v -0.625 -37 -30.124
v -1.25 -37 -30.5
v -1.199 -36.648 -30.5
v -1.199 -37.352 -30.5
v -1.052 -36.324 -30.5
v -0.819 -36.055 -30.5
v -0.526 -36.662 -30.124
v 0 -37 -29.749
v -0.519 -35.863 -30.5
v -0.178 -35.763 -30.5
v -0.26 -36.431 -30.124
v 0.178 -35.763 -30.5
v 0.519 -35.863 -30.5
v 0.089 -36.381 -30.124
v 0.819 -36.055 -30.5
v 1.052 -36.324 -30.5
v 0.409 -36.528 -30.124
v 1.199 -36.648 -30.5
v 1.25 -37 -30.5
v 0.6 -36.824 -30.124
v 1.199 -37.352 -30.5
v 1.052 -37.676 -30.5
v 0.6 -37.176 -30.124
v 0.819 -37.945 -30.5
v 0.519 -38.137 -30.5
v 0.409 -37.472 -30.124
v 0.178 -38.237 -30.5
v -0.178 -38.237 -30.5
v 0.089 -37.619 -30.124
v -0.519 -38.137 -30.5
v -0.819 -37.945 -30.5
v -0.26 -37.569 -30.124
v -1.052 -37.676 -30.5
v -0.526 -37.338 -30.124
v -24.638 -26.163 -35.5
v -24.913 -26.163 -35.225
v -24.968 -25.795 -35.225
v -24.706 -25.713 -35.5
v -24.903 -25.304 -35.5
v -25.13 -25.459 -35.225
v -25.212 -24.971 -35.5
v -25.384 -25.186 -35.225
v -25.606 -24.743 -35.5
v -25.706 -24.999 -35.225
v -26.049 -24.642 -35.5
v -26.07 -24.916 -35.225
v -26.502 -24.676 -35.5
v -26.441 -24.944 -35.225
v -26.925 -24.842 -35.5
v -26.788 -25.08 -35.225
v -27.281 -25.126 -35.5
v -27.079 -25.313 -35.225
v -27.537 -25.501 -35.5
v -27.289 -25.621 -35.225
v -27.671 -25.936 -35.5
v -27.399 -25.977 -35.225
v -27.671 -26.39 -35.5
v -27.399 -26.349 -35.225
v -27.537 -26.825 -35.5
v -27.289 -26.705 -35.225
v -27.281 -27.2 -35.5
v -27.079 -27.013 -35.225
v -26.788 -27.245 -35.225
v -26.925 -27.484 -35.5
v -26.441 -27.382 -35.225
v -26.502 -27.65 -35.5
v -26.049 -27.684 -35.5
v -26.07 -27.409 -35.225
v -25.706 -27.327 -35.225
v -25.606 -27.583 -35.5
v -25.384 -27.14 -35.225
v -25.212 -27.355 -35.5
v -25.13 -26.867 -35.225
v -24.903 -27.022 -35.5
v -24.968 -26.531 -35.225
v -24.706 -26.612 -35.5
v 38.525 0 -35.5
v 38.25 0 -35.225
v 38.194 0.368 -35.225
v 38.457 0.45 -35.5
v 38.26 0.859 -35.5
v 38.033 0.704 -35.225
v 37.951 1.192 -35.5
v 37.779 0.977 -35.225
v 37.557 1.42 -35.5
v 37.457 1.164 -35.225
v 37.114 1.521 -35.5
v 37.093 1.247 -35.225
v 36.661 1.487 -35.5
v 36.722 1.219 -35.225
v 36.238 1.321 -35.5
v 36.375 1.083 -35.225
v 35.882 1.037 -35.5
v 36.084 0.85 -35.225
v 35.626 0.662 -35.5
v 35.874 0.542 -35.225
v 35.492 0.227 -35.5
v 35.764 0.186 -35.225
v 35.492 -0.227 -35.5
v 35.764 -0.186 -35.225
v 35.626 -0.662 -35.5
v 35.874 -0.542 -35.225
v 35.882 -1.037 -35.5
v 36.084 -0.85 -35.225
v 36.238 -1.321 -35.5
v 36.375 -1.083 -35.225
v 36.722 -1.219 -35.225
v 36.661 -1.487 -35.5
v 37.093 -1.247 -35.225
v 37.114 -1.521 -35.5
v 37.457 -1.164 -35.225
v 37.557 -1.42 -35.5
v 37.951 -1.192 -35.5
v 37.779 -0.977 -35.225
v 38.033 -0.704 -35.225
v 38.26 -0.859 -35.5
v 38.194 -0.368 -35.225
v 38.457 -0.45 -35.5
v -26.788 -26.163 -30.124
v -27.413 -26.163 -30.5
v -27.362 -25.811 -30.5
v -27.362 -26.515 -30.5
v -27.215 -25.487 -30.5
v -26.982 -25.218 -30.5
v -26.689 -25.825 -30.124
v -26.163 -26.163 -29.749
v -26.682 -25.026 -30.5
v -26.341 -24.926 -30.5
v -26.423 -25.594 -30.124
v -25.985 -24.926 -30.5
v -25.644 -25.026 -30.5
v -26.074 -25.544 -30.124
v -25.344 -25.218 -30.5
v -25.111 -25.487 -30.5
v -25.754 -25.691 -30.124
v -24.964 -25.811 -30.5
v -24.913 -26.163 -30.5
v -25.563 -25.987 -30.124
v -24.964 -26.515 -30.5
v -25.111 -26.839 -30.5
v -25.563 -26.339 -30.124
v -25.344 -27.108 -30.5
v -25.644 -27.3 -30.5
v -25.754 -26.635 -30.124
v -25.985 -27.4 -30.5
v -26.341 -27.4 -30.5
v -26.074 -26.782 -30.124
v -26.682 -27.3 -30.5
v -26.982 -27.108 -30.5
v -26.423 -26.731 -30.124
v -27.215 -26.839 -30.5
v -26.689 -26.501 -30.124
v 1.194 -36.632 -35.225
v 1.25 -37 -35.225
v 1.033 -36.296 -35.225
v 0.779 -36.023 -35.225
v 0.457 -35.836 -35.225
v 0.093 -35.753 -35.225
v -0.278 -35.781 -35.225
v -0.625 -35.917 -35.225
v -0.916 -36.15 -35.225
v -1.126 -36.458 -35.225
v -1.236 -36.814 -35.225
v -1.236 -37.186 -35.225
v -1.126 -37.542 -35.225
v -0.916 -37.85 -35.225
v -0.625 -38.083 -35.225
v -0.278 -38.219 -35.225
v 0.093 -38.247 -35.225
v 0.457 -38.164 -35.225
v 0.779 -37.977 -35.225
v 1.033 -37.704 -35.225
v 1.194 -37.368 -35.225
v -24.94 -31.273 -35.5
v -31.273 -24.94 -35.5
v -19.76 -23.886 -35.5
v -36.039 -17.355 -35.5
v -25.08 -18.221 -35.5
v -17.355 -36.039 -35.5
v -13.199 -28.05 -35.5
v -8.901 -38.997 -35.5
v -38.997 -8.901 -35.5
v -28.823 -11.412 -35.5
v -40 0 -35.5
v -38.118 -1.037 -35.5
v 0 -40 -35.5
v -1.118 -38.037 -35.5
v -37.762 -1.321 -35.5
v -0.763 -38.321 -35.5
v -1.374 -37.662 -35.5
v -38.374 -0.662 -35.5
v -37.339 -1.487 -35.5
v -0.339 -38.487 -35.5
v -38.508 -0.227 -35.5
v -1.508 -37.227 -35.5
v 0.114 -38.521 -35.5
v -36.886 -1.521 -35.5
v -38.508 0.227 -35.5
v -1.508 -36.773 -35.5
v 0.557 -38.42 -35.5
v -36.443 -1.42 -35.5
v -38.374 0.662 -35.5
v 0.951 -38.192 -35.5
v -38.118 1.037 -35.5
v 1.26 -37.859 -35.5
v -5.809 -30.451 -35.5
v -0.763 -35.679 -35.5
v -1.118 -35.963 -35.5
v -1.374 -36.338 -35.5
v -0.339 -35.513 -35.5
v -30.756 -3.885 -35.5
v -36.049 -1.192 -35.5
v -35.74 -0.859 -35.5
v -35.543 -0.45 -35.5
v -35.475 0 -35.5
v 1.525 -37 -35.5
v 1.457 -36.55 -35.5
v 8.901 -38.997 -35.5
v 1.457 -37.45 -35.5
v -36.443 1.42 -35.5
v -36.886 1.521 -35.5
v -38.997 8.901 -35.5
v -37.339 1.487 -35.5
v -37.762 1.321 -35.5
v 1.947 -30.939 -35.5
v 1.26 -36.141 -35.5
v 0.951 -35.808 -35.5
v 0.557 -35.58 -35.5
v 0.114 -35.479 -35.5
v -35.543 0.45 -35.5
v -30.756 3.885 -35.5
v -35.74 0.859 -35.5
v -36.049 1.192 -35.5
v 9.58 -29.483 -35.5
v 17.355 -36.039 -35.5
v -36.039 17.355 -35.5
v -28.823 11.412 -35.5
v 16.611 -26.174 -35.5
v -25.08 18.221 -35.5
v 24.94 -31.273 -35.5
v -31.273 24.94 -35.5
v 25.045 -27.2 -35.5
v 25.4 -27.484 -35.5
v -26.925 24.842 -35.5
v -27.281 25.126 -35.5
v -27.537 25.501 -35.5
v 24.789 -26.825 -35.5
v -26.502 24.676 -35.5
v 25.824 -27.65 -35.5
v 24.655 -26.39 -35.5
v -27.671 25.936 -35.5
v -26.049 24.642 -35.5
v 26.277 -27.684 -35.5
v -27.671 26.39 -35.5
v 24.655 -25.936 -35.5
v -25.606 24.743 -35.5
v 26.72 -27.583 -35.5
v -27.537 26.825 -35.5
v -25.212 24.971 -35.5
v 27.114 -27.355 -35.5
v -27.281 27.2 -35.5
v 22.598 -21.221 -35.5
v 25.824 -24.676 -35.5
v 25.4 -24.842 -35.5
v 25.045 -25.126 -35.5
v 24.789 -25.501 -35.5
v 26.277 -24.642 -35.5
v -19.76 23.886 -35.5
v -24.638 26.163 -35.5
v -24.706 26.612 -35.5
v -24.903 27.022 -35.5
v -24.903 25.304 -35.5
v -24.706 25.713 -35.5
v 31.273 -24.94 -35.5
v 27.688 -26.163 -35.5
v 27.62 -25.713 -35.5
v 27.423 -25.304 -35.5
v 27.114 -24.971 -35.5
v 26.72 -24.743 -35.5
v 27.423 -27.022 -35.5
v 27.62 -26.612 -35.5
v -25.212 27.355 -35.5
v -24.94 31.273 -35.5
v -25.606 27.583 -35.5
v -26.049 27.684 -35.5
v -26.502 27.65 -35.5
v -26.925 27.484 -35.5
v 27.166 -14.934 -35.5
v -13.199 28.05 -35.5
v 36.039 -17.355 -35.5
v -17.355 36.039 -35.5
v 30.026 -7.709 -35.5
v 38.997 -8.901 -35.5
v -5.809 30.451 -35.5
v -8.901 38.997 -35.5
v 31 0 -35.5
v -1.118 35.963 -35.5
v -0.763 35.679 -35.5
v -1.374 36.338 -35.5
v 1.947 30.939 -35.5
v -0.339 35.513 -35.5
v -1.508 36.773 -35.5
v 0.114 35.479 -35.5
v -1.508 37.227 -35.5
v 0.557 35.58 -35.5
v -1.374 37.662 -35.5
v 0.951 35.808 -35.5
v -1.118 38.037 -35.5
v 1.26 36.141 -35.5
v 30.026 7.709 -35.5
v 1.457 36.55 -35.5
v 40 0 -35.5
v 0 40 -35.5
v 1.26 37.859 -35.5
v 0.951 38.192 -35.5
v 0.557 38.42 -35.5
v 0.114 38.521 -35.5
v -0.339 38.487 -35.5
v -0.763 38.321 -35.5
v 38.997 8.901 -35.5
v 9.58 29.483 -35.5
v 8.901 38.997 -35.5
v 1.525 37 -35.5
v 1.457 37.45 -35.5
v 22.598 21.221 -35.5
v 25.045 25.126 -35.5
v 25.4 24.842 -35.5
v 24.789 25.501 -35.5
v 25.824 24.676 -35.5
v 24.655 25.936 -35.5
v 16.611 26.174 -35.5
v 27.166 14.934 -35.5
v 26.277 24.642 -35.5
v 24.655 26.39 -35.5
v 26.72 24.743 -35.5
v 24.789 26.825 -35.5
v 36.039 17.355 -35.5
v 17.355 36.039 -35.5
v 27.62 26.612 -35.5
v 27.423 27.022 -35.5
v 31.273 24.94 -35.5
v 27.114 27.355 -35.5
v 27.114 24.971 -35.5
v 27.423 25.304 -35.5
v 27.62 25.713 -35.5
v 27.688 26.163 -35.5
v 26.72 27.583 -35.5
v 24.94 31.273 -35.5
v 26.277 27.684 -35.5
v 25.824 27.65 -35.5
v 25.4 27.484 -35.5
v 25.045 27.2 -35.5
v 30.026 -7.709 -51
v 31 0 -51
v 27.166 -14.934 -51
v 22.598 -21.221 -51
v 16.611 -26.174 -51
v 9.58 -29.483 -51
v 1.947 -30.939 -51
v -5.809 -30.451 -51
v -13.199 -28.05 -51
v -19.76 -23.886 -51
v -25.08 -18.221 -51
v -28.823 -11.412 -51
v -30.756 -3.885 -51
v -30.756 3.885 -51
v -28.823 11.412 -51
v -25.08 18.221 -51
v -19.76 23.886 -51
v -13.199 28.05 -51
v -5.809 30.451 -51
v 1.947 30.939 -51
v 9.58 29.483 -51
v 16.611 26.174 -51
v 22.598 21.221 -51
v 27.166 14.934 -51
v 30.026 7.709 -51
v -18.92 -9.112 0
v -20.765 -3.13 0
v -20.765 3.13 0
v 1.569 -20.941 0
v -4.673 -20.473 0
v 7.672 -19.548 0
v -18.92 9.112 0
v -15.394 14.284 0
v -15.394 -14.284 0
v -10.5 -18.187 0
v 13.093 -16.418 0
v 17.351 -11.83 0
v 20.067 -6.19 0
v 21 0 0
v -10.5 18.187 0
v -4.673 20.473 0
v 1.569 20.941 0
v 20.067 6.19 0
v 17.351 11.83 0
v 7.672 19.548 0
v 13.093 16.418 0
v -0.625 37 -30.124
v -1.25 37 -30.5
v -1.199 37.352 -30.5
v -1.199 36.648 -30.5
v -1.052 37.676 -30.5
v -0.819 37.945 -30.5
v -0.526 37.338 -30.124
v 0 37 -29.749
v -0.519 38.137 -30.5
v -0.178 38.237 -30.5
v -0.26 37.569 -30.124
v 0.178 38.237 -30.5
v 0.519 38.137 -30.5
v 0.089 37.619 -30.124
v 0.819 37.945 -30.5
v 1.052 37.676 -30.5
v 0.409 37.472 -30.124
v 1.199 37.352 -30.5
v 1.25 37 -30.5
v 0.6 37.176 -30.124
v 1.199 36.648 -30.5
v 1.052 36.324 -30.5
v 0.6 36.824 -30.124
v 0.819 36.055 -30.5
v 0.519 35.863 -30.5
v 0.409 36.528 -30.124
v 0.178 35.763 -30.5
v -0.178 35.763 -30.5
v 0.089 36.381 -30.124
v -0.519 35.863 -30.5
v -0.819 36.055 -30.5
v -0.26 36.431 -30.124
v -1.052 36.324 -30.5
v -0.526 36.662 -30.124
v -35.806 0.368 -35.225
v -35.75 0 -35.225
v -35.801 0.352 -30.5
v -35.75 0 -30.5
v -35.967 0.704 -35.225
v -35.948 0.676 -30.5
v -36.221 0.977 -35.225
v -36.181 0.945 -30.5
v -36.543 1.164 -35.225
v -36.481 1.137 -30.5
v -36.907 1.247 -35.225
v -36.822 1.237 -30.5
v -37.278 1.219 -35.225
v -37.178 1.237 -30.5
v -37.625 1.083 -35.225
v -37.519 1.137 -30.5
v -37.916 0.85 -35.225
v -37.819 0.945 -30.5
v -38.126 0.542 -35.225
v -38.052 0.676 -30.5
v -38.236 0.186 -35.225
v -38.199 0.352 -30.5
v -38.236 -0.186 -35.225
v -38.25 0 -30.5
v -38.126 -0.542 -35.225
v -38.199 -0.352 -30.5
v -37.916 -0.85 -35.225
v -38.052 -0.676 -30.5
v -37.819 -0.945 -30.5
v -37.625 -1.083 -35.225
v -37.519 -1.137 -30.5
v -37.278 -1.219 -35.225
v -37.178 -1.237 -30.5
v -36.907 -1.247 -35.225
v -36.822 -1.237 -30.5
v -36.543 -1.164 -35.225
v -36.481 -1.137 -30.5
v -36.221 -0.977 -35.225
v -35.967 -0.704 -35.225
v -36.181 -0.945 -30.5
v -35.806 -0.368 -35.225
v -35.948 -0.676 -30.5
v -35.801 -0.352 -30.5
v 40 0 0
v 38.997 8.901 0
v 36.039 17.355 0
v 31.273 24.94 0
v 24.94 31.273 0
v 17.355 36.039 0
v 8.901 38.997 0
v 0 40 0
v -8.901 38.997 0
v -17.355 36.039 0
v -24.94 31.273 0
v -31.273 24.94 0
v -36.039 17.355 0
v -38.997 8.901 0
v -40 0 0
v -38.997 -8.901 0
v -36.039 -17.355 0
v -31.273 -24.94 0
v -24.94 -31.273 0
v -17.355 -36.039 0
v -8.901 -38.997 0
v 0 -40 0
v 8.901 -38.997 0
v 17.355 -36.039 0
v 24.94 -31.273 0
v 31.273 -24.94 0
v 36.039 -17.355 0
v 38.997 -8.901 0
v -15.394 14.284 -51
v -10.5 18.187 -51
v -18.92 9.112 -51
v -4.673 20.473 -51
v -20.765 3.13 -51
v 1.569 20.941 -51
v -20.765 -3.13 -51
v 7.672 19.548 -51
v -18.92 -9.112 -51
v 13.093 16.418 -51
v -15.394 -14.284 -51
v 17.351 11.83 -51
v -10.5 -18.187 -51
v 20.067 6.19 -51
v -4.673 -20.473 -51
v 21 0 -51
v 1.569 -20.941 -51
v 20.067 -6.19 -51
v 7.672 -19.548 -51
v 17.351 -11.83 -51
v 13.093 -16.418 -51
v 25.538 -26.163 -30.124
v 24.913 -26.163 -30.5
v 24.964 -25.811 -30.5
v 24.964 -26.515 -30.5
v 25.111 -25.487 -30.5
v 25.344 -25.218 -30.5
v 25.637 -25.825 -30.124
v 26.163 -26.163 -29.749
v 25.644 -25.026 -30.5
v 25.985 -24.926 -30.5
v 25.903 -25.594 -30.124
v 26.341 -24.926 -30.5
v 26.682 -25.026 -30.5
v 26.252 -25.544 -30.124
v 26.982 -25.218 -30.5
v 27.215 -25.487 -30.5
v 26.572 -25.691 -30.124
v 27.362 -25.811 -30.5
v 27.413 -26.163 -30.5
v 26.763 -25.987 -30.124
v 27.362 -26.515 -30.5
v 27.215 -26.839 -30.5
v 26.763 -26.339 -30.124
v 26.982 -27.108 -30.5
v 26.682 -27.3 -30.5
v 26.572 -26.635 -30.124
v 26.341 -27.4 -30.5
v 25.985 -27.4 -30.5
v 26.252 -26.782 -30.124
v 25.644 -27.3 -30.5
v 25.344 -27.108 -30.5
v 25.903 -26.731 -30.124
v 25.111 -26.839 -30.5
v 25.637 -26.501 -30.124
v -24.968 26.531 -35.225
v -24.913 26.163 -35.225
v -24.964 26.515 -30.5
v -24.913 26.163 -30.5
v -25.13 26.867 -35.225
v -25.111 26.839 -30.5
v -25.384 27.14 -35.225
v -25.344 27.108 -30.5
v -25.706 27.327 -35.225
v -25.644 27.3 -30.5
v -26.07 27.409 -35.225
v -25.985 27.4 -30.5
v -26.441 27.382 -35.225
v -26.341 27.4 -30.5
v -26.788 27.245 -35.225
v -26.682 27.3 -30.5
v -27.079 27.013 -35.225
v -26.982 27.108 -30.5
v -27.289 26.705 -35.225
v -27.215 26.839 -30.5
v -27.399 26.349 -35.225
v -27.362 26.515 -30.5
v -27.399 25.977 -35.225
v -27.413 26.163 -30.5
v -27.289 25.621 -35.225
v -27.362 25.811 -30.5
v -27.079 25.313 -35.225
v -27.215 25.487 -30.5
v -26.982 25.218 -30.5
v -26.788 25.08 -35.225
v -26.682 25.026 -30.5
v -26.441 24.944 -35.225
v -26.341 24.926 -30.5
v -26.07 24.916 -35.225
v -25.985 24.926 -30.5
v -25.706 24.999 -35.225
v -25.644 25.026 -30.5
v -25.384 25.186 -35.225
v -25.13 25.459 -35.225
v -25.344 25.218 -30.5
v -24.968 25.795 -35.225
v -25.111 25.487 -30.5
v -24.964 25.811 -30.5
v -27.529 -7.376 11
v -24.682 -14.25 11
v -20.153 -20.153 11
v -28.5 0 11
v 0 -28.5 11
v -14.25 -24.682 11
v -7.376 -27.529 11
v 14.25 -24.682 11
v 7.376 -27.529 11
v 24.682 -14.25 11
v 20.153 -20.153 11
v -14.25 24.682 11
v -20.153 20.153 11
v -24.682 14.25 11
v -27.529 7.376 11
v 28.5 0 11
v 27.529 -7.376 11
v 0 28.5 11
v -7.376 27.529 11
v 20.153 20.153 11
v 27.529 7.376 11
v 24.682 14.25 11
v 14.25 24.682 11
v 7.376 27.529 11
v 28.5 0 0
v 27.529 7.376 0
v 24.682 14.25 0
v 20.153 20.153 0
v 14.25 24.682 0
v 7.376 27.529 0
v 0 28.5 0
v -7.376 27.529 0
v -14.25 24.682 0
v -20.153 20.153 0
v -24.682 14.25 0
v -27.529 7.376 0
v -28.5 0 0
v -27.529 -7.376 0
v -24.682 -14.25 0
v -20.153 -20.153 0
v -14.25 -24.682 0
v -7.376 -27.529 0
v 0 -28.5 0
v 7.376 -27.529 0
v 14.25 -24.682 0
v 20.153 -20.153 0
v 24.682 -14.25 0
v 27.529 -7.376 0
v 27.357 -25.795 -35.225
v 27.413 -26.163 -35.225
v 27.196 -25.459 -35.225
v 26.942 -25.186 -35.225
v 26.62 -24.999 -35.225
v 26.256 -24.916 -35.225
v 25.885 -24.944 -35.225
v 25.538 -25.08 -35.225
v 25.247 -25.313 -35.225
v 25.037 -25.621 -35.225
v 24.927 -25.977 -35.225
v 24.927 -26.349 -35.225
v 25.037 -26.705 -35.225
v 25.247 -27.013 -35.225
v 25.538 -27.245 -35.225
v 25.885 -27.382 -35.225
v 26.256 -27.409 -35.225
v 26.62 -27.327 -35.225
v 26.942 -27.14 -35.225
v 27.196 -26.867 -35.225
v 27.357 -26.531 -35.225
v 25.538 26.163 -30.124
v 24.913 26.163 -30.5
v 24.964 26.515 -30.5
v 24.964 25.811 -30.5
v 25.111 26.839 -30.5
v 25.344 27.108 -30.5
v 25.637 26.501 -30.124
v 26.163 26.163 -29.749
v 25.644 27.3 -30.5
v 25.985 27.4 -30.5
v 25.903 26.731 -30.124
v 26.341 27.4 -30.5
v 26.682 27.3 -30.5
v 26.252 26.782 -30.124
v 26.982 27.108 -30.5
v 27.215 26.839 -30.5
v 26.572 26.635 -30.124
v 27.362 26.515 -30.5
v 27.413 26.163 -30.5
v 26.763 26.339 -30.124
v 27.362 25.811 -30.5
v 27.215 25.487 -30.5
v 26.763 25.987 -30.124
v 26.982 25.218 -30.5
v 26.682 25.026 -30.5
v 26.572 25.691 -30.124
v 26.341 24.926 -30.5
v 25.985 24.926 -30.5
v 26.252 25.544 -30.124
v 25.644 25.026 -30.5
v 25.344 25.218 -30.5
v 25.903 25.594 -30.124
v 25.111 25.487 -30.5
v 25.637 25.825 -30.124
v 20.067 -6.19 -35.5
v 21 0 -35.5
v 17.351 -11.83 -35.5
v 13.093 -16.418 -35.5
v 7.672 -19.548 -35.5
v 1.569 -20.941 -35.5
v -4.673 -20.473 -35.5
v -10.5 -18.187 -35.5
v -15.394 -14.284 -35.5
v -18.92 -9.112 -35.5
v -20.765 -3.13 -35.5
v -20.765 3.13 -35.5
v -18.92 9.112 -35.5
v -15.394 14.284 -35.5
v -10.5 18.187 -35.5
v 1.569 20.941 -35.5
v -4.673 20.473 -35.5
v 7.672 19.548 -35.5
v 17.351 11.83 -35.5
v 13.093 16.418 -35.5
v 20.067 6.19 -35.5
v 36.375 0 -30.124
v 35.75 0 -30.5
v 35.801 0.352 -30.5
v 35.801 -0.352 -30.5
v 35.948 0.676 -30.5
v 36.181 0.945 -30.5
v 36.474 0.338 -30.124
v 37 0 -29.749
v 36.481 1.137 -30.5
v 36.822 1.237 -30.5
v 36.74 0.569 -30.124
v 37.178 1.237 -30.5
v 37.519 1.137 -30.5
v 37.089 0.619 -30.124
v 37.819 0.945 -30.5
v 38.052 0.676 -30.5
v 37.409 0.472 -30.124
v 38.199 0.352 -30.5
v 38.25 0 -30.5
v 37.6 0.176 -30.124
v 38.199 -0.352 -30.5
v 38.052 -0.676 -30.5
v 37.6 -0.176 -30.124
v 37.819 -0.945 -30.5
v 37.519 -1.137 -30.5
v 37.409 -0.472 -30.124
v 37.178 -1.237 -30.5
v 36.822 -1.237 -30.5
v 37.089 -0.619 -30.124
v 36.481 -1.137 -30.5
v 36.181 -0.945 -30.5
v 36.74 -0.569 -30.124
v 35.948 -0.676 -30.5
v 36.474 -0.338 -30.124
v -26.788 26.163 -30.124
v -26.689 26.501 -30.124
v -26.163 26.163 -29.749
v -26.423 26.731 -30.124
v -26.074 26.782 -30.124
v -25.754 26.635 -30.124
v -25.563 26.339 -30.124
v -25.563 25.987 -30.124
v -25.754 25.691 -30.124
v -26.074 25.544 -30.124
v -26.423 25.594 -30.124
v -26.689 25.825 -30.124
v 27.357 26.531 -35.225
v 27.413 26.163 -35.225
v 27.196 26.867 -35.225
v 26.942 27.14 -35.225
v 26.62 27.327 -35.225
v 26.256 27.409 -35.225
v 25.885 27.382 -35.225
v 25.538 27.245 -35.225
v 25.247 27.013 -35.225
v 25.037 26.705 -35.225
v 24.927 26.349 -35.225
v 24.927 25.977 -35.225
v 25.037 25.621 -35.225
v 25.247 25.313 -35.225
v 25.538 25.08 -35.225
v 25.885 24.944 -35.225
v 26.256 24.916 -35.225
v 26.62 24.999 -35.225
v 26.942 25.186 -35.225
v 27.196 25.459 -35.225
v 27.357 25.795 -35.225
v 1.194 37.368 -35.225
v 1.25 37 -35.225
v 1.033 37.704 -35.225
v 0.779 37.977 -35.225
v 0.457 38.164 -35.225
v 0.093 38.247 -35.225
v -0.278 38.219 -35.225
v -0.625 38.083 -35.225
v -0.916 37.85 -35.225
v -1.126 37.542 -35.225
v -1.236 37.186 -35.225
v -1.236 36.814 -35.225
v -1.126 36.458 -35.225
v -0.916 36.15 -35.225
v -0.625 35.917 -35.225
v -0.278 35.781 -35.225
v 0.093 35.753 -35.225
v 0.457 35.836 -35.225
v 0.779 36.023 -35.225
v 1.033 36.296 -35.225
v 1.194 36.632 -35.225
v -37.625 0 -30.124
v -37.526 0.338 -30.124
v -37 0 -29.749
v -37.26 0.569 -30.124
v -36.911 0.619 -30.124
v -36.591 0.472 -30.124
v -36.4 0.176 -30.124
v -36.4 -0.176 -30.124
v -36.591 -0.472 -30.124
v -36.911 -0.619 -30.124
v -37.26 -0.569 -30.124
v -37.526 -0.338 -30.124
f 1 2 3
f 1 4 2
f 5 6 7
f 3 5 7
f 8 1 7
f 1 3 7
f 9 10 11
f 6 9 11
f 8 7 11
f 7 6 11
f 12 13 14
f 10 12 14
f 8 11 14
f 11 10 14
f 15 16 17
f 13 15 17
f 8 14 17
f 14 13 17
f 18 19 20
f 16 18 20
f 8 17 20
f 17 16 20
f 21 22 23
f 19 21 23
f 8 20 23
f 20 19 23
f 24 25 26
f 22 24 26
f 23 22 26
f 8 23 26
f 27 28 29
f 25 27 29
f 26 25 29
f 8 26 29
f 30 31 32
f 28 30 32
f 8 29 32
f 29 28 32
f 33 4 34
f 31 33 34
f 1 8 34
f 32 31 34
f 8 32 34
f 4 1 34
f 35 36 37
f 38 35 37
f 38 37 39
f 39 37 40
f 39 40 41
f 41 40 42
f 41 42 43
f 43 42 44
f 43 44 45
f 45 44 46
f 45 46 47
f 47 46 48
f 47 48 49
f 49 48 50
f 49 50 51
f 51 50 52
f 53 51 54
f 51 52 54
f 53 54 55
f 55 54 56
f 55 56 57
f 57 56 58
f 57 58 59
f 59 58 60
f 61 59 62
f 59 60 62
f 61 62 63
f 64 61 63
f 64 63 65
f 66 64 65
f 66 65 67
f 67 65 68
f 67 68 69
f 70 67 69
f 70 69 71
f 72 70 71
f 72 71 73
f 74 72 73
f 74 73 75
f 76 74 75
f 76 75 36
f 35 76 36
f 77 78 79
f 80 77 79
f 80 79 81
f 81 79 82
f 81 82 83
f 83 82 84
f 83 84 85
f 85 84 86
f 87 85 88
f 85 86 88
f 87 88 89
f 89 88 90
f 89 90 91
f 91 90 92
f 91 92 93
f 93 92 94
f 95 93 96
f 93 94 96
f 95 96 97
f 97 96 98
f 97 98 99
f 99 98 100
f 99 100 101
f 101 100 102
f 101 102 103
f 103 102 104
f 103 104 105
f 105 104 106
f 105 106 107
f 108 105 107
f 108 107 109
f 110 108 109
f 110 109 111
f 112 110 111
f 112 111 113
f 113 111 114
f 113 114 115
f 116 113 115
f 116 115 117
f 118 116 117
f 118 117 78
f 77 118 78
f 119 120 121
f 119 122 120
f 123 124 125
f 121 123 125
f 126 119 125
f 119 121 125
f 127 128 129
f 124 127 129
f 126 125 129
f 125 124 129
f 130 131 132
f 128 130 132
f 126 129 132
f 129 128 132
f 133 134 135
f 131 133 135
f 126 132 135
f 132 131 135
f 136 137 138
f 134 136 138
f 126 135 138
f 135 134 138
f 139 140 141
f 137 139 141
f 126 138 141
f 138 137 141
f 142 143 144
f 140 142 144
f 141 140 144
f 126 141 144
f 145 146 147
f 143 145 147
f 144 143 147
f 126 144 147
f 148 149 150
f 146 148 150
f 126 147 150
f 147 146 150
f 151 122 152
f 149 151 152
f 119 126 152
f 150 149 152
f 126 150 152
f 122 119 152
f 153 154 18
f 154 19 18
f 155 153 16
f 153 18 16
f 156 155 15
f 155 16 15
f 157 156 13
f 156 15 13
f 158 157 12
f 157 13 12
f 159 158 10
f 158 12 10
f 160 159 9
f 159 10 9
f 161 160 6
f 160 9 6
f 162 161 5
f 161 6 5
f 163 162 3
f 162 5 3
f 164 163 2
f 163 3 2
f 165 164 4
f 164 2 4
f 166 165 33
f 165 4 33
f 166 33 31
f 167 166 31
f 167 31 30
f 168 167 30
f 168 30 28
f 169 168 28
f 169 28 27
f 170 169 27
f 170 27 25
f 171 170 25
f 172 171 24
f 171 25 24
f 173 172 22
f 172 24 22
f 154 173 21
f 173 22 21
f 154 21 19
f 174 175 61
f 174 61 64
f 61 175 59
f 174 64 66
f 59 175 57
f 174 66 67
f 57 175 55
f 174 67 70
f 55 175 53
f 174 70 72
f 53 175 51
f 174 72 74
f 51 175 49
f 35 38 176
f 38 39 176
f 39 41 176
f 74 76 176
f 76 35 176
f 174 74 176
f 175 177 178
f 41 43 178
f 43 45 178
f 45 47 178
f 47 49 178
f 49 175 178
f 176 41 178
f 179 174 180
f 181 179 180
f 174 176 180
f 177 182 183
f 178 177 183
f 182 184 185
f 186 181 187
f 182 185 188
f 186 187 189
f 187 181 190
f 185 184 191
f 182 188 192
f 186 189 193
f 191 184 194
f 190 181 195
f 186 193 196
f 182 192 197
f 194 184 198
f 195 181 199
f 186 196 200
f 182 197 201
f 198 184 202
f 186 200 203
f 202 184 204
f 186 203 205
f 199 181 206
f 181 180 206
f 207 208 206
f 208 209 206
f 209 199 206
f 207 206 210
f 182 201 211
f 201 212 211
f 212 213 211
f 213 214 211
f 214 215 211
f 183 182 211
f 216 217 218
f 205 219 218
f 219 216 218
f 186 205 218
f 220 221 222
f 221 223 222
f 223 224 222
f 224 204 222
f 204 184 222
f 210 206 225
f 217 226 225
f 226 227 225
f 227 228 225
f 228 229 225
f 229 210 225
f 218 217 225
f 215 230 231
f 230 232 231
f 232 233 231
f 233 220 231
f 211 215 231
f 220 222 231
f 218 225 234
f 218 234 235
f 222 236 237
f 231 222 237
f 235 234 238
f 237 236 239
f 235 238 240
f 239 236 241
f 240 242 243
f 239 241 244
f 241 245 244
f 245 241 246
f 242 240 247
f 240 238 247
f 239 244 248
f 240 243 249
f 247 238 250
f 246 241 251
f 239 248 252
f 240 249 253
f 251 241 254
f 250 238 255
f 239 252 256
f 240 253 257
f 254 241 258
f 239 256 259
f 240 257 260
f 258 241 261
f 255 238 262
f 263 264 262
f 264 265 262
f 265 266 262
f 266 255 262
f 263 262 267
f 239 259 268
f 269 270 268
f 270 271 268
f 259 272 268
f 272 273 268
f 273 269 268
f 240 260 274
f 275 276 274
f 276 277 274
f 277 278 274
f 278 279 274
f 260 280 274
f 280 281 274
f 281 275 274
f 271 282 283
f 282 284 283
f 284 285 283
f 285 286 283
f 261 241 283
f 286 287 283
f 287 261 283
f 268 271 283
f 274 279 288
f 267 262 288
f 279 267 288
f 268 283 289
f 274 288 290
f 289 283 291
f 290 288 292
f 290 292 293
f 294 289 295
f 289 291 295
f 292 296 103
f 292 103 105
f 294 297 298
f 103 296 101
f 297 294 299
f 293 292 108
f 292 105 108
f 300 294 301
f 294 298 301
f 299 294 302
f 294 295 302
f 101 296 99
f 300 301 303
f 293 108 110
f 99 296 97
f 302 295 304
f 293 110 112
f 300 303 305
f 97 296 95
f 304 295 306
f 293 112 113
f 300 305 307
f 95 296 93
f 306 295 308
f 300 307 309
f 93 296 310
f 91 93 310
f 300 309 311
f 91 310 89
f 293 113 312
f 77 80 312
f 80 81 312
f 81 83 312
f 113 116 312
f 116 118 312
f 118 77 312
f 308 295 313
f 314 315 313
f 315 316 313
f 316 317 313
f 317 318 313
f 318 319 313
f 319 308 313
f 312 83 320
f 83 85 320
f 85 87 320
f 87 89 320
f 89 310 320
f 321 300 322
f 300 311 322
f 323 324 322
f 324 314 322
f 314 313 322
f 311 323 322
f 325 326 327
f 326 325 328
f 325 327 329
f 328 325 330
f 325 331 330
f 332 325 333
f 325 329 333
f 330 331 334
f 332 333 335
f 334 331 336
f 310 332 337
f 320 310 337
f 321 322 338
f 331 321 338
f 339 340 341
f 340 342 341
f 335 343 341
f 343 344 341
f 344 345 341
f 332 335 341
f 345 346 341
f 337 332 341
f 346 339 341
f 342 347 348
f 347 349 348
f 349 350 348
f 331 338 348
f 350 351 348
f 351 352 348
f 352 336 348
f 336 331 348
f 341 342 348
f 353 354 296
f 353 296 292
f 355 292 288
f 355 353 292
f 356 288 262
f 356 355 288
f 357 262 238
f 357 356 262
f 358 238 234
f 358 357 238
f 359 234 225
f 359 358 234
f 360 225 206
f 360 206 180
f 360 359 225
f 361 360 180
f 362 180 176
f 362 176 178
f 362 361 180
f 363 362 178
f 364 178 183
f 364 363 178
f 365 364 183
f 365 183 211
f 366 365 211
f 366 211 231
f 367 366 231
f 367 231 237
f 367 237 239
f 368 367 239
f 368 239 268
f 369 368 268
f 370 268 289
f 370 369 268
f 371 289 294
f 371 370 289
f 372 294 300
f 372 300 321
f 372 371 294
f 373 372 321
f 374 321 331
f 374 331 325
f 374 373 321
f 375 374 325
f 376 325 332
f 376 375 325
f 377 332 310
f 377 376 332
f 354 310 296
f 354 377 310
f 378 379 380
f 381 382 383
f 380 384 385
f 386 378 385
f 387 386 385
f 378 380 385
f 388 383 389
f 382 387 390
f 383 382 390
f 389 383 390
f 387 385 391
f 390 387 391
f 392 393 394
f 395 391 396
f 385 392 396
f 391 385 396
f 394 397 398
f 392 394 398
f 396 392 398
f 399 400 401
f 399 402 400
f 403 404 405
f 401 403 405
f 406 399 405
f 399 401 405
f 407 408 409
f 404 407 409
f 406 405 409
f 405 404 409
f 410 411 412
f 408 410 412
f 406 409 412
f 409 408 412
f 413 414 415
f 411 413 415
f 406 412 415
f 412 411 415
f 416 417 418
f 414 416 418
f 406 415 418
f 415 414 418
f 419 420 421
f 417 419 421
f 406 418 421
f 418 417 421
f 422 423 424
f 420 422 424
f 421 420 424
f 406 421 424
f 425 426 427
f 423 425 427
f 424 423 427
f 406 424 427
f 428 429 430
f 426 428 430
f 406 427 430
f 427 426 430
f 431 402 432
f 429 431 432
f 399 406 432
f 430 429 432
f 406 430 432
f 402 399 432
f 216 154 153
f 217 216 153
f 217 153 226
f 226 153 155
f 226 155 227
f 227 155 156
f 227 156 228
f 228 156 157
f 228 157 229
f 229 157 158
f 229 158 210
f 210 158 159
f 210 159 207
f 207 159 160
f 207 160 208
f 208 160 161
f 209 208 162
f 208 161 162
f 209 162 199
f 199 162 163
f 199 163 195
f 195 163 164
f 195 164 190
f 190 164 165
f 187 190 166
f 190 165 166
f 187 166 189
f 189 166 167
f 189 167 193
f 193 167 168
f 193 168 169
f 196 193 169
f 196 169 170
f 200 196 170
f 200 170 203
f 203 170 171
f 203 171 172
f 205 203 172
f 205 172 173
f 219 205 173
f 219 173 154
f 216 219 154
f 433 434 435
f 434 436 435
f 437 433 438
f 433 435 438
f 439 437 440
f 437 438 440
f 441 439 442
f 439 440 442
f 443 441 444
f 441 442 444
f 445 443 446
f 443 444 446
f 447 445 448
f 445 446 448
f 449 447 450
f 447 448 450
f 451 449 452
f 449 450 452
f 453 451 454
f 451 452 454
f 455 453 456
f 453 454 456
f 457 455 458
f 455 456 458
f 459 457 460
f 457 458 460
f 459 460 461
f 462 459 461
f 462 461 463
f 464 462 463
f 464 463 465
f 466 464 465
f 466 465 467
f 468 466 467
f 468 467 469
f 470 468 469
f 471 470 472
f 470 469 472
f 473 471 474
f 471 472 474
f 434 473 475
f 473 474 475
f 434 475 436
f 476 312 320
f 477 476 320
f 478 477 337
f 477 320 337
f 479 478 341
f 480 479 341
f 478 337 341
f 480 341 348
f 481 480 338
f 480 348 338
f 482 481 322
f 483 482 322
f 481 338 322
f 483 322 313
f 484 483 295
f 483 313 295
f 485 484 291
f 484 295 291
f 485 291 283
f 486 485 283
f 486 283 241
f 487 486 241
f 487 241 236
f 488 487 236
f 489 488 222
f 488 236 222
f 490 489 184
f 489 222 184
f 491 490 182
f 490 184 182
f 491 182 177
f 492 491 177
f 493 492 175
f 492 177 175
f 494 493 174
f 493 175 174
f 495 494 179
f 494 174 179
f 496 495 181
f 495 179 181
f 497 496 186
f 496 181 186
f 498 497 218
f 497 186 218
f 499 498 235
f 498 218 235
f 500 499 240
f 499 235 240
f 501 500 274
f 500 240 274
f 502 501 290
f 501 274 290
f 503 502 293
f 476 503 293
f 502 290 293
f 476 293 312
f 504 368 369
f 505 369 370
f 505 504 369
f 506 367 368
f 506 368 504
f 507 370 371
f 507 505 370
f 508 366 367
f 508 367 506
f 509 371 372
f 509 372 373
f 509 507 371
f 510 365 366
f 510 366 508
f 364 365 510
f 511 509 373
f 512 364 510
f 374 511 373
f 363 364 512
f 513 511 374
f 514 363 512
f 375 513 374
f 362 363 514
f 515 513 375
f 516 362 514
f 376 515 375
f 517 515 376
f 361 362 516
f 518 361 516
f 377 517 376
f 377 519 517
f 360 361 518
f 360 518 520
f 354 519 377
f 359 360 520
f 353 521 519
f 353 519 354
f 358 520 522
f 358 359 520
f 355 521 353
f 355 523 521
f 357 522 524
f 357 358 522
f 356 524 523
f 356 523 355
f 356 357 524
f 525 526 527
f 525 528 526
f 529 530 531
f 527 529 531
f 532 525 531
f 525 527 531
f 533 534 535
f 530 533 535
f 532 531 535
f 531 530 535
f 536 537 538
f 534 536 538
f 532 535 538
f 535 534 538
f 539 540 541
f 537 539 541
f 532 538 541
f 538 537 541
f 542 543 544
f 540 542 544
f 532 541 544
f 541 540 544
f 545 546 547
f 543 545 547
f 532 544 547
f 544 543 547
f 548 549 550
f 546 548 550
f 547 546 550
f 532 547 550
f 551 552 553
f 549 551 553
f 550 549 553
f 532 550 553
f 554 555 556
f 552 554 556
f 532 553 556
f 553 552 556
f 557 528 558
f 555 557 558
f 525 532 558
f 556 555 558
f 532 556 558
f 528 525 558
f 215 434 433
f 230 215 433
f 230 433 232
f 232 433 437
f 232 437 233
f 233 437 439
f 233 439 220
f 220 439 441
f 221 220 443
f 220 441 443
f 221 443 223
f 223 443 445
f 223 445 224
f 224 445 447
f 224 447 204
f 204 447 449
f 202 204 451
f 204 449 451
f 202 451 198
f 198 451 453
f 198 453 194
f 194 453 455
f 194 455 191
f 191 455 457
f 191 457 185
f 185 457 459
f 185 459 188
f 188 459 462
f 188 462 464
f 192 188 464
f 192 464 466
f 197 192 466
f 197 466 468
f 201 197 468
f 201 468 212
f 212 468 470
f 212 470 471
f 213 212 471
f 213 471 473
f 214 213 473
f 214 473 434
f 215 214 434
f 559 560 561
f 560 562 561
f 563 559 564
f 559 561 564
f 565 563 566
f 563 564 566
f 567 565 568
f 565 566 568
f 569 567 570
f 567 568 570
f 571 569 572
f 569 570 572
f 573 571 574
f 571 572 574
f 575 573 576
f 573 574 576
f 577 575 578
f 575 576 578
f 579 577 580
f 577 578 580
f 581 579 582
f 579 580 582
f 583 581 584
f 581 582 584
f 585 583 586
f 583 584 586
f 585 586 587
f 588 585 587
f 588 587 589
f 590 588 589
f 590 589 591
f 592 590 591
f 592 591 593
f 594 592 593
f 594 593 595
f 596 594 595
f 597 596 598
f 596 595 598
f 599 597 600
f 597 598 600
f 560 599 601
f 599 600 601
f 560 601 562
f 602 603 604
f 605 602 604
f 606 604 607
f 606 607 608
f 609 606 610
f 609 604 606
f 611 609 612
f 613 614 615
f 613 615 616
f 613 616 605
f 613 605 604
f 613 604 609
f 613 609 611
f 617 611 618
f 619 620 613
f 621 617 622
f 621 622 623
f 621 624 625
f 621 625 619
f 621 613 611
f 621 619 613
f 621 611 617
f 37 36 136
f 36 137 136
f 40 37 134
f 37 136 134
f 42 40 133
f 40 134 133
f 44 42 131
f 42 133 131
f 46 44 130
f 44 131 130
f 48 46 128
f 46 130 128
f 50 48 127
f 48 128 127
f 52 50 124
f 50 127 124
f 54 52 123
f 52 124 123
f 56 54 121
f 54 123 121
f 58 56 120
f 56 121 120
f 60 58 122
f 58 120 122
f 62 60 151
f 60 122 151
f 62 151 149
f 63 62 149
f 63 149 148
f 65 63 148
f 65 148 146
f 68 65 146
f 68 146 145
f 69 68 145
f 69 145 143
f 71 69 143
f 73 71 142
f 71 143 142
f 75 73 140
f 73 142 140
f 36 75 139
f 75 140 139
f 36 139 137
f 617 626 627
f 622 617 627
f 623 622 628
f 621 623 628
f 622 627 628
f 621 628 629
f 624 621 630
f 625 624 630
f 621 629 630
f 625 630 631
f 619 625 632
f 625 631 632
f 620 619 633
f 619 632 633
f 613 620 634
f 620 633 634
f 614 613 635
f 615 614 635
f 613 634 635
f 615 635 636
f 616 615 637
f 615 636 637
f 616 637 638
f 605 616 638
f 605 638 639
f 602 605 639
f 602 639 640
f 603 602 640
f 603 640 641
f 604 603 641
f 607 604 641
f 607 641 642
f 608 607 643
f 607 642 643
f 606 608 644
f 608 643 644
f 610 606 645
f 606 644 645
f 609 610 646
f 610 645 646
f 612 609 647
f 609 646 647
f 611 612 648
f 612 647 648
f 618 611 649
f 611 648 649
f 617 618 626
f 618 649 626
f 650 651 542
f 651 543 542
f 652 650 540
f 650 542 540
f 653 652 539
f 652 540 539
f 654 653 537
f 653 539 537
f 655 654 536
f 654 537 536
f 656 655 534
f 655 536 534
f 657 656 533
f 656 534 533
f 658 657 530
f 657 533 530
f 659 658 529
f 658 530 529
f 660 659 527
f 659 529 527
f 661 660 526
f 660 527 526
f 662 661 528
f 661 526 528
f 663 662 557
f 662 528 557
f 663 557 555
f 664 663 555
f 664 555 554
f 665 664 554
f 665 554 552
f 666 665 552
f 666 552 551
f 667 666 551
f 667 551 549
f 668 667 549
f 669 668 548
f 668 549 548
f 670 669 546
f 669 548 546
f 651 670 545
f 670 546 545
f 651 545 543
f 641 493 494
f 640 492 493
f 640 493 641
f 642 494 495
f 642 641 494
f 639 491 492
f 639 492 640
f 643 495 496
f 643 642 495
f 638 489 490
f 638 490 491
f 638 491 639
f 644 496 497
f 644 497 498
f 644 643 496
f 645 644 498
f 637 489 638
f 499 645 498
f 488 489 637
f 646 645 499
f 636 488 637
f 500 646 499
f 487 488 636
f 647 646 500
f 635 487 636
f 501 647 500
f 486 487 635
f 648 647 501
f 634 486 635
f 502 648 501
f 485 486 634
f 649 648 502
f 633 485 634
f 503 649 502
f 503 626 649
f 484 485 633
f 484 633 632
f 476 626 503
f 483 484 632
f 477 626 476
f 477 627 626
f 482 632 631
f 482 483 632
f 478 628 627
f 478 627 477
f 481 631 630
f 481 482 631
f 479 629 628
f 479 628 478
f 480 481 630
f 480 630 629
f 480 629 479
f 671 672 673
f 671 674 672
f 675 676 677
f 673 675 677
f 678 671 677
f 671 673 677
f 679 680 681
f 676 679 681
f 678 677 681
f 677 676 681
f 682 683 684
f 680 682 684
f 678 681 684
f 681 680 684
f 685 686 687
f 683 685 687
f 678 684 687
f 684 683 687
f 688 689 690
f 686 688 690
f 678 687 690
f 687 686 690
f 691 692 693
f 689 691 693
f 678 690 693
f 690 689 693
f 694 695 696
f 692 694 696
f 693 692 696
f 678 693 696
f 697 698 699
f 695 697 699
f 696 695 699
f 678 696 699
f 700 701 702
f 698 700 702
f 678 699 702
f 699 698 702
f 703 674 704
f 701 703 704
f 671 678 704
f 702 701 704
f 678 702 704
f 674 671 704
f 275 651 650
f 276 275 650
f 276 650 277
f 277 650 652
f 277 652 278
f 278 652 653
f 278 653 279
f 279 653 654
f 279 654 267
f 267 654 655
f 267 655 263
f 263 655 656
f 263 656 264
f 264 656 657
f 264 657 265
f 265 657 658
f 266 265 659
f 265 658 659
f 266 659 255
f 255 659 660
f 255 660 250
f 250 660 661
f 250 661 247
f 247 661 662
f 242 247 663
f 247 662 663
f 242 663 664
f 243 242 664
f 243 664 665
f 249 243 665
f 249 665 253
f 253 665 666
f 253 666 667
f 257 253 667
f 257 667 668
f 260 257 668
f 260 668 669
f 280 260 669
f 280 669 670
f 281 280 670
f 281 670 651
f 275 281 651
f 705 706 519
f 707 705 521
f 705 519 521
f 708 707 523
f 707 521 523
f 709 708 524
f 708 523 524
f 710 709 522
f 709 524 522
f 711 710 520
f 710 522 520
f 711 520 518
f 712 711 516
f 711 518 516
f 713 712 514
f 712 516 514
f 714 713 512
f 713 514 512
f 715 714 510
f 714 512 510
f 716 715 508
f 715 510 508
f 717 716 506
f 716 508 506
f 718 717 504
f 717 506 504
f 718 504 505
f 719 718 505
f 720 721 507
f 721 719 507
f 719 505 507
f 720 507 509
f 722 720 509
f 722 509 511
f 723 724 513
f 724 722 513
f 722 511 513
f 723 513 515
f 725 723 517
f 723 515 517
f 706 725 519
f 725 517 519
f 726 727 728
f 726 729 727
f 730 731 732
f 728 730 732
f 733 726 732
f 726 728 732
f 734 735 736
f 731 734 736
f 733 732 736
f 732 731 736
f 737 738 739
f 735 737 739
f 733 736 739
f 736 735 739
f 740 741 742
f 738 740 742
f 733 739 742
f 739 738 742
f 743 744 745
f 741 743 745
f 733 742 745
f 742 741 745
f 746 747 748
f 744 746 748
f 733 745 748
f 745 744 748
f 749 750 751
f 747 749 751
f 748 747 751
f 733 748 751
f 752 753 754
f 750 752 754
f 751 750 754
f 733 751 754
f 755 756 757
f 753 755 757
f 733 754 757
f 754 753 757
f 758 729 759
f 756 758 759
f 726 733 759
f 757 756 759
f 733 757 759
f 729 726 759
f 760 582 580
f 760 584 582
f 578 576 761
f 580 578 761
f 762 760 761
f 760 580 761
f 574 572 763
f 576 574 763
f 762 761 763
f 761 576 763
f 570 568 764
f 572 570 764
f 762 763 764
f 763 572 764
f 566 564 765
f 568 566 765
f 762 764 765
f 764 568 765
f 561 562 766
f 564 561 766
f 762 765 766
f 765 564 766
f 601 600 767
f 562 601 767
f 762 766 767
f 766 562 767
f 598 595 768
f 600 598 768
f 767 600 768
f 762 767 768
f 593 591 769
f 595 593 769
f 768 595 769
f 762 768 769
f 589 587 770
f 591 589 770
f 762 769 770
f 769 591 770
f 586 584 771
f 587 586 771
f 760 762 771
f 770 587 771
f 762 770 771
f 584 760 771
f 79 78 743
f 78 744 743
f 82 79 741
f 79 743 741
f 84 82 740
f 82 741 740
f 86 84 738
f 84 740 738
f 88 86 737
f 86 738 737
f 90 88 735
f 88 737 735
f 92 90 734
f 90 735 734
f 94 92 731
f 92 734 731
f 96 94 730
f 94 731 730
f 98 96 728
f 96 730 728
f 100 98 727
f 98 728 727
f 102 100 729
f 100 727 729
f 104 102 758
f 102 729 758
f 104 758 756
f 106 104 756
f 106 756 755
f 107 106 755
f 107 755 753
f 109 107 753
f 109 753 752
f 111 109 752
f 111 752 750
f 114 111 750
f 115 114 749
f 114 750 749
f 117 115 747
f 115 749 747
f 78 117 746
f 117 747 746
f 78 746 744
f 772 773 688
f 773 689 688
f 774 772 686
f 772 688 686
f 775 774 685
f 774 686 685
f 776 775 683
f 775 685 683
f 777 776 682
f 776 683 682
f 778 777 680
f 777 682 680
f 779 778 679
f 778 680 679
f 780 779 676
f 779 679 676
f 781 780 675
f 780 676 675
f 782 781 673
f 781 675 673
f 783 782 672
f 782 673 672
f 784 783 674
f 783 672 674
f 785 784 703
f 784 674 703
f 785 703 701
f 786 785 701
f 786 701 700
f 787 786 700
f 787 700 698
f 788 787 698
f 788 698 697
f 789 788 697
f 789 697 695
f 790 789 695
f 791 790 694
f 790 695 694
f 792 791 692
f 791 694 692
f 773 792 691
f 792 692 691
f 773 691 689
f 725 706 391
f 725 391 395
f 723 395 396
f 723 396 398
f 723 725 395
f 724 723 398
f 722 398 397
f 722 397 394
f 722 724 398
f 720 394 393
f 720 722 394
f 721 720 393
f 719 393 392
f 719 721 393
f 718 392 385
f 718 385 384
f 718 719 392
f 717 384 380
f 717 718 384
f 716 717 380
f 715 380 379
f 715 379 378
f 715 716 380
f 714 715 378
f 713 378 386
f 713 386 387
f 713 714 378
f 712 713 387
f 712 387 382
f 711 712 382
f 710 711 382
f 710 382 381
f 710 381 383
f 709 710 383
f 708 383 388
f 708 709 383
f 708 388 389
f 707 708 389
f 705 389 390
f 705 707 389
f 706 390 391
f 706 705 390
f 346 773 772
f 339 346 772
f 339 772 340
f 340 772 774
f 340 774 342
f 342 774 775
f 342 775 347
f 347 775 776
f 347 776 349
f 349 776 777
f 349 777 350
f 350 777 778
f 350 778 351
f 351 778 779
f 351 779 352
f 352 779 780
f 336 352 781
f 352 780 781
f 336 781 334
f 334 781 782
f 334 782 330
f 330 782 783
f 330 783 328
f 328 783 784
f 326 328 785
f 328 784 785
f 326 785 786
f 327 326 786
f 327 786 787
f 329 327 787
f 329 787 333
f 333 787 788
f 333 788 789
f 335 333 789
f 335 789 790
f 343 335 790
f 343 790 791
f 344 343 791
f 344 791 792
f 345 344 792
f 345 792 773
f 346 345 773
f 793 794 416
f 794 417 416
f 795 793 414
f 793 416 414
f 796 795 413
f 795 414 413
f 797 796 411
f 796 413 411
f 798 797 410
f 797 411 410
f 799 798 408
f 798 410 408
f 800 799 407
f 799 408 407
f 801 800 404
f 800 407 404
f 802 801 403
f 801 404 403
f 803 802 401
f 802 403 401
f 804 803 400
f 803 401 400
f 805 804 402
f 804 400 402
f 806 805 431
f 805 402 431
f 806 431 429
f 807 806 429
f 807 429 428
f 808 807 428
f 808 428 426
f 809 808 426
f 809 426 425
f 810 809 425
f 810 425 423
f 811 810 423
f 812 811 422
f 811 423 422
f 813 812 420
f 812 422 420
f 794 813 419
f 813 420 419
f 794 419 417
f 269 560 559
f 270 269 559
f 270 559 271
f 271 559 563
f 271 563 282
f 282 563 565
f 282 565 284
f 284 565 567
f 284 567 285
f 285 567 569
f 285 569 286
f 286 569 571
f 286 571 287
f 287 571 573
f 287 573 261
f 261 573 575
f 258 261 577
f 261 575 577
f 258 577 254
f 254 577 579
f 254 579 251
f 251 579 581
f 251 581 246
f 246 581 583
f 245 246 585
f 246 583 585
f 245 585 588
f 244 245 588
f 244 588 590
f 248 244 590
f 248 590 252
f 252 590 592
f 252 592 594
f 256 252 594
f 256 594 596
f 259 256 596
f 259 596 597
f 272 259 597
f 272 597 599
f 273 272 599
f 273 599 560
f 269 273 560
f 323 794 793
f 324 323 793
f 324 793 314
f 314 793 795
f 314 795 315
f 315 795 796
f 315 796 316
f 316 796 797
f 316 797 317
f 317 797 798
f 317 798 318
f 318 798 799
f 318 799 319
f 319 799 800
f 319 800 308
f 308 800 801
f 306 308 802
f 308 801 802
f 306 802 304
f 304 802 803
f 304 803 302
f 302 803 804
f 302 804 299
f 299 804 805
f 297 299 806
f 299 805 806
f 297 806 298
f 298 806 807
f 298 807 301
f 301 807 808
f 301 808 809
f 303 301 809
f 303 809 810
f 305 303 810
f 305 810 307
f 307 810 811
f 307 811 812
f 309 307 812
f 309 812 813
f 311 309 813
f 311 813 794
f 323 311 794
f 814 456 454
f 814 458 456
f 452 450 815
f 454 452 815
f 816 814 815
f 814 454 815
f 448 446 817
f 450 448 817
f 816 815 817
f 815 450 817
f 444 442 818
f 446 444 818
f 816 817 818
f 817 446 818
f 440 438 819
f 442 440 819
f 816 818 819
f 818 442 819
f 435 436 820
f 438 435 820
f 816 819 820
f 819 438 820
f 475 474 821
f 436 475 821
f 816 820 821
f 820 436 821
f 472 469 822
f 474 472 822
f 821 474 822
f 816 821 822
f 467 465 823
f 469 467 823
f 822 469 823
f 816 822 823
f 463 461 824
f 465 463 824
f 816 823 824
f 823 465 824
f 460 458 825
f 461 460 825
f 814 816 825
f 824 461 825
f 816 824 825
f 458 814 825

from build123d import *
from build123d.topology import SkipClean

# Parameters (mm, degrees)
SKETCH1_R                   = 28.5
BOSS_EXTRUDE1_DEPTH         = 11
SKETCH1_3_R                 = 40
SKETCH1_3_R_2               = 21
BOSS_EXTRUDE2_DEPTH         = 35.5
M3_TAPPED_HOLE1_D           = 2.5
M3_TAPPED_HOLE1_DEPTH       = 5
M3_TAPPED_HOLE1_CSINK_D     = 3.05
M3_TAPPED_HOLE1_CSINK_ANGLE = 90
M3_TAPPED_HOLE1_TIP         = 0.751075774
SKETCH5_R                   = 31
SKETCH5_R_2                 = 21
BOSS_EXTRUDE3_DEPTH         = 15.5


with BuildPart() as part:
    # Sketch1 → Boss-Extrude1 (new body)
    with BuildSketch(Plane.XY):
        Circle(SKETCH1_R)
    extrude(amount=BOSS_EXTRUDE1_DEPTH)

    # Sketch1<3> → Boss-Extrude2 (add)
    with BuildSketch(Plane.XY):
        Circle(SKETCH1_3_R)
        Circle(SKETCH1_3_R_2, mode=Mode.SUBTRACT)
    extrude(amount=-BOSS_EXTRUDE2_DEPTH)

    # M3 Tapped Hole1
    with Locations(Plane(origin=(0, 0, -35.5), x_dir=(-1, 0, 0), z_dir=(0, 0, -1))):
        with Locations((0, 37), (26.162950904, 26.162950904), (37, 0), (26.162950904, -26.162950904), (0, -37), (-26.162950904, -26.162950904), (-37, 0), (-26.162950904, 26.162950904)):
            CounterSinkHole(M3_TAPPED_HOLE1_D / 2, M3_TAPPED_HOLE1_CSINK_D / 2, depth=M3_TAPPED_HOLE1_DEPTH, counter_sink_angle=M3_TAPPED_HOLE1_CSINK_ANGLE)
            with Locations((0, 0, -(M3_TAPPED_HOLE1_DEPTH + M3_TAPPED_HOLE1_TIP / 2))):  # 118° drill point
                Cone(0, M3_TAPPED_HOLE1_D / 2, M3_TAPPED_HOLE1_TIP, mode=Mode.SUBTRACT)

    # Sketch5 → Boss-Extrude3 (add)
    with SkipClean():  # the faces are left unmerged after this step: merging them gives an invalid solid
        with BuildSketch(Plane(origin=(0, 0, -35.5), x_dir=(-1, 0, 0), z_dir=(0, 0, -1))):
            Circle(SKETCH5_R)
            Circle(SKETCH5_R_2, mode=Mode.SUBTRACT)
        extrude(amount=BOSS_EXTRUDE3_DEPTH)


solid = part.part
